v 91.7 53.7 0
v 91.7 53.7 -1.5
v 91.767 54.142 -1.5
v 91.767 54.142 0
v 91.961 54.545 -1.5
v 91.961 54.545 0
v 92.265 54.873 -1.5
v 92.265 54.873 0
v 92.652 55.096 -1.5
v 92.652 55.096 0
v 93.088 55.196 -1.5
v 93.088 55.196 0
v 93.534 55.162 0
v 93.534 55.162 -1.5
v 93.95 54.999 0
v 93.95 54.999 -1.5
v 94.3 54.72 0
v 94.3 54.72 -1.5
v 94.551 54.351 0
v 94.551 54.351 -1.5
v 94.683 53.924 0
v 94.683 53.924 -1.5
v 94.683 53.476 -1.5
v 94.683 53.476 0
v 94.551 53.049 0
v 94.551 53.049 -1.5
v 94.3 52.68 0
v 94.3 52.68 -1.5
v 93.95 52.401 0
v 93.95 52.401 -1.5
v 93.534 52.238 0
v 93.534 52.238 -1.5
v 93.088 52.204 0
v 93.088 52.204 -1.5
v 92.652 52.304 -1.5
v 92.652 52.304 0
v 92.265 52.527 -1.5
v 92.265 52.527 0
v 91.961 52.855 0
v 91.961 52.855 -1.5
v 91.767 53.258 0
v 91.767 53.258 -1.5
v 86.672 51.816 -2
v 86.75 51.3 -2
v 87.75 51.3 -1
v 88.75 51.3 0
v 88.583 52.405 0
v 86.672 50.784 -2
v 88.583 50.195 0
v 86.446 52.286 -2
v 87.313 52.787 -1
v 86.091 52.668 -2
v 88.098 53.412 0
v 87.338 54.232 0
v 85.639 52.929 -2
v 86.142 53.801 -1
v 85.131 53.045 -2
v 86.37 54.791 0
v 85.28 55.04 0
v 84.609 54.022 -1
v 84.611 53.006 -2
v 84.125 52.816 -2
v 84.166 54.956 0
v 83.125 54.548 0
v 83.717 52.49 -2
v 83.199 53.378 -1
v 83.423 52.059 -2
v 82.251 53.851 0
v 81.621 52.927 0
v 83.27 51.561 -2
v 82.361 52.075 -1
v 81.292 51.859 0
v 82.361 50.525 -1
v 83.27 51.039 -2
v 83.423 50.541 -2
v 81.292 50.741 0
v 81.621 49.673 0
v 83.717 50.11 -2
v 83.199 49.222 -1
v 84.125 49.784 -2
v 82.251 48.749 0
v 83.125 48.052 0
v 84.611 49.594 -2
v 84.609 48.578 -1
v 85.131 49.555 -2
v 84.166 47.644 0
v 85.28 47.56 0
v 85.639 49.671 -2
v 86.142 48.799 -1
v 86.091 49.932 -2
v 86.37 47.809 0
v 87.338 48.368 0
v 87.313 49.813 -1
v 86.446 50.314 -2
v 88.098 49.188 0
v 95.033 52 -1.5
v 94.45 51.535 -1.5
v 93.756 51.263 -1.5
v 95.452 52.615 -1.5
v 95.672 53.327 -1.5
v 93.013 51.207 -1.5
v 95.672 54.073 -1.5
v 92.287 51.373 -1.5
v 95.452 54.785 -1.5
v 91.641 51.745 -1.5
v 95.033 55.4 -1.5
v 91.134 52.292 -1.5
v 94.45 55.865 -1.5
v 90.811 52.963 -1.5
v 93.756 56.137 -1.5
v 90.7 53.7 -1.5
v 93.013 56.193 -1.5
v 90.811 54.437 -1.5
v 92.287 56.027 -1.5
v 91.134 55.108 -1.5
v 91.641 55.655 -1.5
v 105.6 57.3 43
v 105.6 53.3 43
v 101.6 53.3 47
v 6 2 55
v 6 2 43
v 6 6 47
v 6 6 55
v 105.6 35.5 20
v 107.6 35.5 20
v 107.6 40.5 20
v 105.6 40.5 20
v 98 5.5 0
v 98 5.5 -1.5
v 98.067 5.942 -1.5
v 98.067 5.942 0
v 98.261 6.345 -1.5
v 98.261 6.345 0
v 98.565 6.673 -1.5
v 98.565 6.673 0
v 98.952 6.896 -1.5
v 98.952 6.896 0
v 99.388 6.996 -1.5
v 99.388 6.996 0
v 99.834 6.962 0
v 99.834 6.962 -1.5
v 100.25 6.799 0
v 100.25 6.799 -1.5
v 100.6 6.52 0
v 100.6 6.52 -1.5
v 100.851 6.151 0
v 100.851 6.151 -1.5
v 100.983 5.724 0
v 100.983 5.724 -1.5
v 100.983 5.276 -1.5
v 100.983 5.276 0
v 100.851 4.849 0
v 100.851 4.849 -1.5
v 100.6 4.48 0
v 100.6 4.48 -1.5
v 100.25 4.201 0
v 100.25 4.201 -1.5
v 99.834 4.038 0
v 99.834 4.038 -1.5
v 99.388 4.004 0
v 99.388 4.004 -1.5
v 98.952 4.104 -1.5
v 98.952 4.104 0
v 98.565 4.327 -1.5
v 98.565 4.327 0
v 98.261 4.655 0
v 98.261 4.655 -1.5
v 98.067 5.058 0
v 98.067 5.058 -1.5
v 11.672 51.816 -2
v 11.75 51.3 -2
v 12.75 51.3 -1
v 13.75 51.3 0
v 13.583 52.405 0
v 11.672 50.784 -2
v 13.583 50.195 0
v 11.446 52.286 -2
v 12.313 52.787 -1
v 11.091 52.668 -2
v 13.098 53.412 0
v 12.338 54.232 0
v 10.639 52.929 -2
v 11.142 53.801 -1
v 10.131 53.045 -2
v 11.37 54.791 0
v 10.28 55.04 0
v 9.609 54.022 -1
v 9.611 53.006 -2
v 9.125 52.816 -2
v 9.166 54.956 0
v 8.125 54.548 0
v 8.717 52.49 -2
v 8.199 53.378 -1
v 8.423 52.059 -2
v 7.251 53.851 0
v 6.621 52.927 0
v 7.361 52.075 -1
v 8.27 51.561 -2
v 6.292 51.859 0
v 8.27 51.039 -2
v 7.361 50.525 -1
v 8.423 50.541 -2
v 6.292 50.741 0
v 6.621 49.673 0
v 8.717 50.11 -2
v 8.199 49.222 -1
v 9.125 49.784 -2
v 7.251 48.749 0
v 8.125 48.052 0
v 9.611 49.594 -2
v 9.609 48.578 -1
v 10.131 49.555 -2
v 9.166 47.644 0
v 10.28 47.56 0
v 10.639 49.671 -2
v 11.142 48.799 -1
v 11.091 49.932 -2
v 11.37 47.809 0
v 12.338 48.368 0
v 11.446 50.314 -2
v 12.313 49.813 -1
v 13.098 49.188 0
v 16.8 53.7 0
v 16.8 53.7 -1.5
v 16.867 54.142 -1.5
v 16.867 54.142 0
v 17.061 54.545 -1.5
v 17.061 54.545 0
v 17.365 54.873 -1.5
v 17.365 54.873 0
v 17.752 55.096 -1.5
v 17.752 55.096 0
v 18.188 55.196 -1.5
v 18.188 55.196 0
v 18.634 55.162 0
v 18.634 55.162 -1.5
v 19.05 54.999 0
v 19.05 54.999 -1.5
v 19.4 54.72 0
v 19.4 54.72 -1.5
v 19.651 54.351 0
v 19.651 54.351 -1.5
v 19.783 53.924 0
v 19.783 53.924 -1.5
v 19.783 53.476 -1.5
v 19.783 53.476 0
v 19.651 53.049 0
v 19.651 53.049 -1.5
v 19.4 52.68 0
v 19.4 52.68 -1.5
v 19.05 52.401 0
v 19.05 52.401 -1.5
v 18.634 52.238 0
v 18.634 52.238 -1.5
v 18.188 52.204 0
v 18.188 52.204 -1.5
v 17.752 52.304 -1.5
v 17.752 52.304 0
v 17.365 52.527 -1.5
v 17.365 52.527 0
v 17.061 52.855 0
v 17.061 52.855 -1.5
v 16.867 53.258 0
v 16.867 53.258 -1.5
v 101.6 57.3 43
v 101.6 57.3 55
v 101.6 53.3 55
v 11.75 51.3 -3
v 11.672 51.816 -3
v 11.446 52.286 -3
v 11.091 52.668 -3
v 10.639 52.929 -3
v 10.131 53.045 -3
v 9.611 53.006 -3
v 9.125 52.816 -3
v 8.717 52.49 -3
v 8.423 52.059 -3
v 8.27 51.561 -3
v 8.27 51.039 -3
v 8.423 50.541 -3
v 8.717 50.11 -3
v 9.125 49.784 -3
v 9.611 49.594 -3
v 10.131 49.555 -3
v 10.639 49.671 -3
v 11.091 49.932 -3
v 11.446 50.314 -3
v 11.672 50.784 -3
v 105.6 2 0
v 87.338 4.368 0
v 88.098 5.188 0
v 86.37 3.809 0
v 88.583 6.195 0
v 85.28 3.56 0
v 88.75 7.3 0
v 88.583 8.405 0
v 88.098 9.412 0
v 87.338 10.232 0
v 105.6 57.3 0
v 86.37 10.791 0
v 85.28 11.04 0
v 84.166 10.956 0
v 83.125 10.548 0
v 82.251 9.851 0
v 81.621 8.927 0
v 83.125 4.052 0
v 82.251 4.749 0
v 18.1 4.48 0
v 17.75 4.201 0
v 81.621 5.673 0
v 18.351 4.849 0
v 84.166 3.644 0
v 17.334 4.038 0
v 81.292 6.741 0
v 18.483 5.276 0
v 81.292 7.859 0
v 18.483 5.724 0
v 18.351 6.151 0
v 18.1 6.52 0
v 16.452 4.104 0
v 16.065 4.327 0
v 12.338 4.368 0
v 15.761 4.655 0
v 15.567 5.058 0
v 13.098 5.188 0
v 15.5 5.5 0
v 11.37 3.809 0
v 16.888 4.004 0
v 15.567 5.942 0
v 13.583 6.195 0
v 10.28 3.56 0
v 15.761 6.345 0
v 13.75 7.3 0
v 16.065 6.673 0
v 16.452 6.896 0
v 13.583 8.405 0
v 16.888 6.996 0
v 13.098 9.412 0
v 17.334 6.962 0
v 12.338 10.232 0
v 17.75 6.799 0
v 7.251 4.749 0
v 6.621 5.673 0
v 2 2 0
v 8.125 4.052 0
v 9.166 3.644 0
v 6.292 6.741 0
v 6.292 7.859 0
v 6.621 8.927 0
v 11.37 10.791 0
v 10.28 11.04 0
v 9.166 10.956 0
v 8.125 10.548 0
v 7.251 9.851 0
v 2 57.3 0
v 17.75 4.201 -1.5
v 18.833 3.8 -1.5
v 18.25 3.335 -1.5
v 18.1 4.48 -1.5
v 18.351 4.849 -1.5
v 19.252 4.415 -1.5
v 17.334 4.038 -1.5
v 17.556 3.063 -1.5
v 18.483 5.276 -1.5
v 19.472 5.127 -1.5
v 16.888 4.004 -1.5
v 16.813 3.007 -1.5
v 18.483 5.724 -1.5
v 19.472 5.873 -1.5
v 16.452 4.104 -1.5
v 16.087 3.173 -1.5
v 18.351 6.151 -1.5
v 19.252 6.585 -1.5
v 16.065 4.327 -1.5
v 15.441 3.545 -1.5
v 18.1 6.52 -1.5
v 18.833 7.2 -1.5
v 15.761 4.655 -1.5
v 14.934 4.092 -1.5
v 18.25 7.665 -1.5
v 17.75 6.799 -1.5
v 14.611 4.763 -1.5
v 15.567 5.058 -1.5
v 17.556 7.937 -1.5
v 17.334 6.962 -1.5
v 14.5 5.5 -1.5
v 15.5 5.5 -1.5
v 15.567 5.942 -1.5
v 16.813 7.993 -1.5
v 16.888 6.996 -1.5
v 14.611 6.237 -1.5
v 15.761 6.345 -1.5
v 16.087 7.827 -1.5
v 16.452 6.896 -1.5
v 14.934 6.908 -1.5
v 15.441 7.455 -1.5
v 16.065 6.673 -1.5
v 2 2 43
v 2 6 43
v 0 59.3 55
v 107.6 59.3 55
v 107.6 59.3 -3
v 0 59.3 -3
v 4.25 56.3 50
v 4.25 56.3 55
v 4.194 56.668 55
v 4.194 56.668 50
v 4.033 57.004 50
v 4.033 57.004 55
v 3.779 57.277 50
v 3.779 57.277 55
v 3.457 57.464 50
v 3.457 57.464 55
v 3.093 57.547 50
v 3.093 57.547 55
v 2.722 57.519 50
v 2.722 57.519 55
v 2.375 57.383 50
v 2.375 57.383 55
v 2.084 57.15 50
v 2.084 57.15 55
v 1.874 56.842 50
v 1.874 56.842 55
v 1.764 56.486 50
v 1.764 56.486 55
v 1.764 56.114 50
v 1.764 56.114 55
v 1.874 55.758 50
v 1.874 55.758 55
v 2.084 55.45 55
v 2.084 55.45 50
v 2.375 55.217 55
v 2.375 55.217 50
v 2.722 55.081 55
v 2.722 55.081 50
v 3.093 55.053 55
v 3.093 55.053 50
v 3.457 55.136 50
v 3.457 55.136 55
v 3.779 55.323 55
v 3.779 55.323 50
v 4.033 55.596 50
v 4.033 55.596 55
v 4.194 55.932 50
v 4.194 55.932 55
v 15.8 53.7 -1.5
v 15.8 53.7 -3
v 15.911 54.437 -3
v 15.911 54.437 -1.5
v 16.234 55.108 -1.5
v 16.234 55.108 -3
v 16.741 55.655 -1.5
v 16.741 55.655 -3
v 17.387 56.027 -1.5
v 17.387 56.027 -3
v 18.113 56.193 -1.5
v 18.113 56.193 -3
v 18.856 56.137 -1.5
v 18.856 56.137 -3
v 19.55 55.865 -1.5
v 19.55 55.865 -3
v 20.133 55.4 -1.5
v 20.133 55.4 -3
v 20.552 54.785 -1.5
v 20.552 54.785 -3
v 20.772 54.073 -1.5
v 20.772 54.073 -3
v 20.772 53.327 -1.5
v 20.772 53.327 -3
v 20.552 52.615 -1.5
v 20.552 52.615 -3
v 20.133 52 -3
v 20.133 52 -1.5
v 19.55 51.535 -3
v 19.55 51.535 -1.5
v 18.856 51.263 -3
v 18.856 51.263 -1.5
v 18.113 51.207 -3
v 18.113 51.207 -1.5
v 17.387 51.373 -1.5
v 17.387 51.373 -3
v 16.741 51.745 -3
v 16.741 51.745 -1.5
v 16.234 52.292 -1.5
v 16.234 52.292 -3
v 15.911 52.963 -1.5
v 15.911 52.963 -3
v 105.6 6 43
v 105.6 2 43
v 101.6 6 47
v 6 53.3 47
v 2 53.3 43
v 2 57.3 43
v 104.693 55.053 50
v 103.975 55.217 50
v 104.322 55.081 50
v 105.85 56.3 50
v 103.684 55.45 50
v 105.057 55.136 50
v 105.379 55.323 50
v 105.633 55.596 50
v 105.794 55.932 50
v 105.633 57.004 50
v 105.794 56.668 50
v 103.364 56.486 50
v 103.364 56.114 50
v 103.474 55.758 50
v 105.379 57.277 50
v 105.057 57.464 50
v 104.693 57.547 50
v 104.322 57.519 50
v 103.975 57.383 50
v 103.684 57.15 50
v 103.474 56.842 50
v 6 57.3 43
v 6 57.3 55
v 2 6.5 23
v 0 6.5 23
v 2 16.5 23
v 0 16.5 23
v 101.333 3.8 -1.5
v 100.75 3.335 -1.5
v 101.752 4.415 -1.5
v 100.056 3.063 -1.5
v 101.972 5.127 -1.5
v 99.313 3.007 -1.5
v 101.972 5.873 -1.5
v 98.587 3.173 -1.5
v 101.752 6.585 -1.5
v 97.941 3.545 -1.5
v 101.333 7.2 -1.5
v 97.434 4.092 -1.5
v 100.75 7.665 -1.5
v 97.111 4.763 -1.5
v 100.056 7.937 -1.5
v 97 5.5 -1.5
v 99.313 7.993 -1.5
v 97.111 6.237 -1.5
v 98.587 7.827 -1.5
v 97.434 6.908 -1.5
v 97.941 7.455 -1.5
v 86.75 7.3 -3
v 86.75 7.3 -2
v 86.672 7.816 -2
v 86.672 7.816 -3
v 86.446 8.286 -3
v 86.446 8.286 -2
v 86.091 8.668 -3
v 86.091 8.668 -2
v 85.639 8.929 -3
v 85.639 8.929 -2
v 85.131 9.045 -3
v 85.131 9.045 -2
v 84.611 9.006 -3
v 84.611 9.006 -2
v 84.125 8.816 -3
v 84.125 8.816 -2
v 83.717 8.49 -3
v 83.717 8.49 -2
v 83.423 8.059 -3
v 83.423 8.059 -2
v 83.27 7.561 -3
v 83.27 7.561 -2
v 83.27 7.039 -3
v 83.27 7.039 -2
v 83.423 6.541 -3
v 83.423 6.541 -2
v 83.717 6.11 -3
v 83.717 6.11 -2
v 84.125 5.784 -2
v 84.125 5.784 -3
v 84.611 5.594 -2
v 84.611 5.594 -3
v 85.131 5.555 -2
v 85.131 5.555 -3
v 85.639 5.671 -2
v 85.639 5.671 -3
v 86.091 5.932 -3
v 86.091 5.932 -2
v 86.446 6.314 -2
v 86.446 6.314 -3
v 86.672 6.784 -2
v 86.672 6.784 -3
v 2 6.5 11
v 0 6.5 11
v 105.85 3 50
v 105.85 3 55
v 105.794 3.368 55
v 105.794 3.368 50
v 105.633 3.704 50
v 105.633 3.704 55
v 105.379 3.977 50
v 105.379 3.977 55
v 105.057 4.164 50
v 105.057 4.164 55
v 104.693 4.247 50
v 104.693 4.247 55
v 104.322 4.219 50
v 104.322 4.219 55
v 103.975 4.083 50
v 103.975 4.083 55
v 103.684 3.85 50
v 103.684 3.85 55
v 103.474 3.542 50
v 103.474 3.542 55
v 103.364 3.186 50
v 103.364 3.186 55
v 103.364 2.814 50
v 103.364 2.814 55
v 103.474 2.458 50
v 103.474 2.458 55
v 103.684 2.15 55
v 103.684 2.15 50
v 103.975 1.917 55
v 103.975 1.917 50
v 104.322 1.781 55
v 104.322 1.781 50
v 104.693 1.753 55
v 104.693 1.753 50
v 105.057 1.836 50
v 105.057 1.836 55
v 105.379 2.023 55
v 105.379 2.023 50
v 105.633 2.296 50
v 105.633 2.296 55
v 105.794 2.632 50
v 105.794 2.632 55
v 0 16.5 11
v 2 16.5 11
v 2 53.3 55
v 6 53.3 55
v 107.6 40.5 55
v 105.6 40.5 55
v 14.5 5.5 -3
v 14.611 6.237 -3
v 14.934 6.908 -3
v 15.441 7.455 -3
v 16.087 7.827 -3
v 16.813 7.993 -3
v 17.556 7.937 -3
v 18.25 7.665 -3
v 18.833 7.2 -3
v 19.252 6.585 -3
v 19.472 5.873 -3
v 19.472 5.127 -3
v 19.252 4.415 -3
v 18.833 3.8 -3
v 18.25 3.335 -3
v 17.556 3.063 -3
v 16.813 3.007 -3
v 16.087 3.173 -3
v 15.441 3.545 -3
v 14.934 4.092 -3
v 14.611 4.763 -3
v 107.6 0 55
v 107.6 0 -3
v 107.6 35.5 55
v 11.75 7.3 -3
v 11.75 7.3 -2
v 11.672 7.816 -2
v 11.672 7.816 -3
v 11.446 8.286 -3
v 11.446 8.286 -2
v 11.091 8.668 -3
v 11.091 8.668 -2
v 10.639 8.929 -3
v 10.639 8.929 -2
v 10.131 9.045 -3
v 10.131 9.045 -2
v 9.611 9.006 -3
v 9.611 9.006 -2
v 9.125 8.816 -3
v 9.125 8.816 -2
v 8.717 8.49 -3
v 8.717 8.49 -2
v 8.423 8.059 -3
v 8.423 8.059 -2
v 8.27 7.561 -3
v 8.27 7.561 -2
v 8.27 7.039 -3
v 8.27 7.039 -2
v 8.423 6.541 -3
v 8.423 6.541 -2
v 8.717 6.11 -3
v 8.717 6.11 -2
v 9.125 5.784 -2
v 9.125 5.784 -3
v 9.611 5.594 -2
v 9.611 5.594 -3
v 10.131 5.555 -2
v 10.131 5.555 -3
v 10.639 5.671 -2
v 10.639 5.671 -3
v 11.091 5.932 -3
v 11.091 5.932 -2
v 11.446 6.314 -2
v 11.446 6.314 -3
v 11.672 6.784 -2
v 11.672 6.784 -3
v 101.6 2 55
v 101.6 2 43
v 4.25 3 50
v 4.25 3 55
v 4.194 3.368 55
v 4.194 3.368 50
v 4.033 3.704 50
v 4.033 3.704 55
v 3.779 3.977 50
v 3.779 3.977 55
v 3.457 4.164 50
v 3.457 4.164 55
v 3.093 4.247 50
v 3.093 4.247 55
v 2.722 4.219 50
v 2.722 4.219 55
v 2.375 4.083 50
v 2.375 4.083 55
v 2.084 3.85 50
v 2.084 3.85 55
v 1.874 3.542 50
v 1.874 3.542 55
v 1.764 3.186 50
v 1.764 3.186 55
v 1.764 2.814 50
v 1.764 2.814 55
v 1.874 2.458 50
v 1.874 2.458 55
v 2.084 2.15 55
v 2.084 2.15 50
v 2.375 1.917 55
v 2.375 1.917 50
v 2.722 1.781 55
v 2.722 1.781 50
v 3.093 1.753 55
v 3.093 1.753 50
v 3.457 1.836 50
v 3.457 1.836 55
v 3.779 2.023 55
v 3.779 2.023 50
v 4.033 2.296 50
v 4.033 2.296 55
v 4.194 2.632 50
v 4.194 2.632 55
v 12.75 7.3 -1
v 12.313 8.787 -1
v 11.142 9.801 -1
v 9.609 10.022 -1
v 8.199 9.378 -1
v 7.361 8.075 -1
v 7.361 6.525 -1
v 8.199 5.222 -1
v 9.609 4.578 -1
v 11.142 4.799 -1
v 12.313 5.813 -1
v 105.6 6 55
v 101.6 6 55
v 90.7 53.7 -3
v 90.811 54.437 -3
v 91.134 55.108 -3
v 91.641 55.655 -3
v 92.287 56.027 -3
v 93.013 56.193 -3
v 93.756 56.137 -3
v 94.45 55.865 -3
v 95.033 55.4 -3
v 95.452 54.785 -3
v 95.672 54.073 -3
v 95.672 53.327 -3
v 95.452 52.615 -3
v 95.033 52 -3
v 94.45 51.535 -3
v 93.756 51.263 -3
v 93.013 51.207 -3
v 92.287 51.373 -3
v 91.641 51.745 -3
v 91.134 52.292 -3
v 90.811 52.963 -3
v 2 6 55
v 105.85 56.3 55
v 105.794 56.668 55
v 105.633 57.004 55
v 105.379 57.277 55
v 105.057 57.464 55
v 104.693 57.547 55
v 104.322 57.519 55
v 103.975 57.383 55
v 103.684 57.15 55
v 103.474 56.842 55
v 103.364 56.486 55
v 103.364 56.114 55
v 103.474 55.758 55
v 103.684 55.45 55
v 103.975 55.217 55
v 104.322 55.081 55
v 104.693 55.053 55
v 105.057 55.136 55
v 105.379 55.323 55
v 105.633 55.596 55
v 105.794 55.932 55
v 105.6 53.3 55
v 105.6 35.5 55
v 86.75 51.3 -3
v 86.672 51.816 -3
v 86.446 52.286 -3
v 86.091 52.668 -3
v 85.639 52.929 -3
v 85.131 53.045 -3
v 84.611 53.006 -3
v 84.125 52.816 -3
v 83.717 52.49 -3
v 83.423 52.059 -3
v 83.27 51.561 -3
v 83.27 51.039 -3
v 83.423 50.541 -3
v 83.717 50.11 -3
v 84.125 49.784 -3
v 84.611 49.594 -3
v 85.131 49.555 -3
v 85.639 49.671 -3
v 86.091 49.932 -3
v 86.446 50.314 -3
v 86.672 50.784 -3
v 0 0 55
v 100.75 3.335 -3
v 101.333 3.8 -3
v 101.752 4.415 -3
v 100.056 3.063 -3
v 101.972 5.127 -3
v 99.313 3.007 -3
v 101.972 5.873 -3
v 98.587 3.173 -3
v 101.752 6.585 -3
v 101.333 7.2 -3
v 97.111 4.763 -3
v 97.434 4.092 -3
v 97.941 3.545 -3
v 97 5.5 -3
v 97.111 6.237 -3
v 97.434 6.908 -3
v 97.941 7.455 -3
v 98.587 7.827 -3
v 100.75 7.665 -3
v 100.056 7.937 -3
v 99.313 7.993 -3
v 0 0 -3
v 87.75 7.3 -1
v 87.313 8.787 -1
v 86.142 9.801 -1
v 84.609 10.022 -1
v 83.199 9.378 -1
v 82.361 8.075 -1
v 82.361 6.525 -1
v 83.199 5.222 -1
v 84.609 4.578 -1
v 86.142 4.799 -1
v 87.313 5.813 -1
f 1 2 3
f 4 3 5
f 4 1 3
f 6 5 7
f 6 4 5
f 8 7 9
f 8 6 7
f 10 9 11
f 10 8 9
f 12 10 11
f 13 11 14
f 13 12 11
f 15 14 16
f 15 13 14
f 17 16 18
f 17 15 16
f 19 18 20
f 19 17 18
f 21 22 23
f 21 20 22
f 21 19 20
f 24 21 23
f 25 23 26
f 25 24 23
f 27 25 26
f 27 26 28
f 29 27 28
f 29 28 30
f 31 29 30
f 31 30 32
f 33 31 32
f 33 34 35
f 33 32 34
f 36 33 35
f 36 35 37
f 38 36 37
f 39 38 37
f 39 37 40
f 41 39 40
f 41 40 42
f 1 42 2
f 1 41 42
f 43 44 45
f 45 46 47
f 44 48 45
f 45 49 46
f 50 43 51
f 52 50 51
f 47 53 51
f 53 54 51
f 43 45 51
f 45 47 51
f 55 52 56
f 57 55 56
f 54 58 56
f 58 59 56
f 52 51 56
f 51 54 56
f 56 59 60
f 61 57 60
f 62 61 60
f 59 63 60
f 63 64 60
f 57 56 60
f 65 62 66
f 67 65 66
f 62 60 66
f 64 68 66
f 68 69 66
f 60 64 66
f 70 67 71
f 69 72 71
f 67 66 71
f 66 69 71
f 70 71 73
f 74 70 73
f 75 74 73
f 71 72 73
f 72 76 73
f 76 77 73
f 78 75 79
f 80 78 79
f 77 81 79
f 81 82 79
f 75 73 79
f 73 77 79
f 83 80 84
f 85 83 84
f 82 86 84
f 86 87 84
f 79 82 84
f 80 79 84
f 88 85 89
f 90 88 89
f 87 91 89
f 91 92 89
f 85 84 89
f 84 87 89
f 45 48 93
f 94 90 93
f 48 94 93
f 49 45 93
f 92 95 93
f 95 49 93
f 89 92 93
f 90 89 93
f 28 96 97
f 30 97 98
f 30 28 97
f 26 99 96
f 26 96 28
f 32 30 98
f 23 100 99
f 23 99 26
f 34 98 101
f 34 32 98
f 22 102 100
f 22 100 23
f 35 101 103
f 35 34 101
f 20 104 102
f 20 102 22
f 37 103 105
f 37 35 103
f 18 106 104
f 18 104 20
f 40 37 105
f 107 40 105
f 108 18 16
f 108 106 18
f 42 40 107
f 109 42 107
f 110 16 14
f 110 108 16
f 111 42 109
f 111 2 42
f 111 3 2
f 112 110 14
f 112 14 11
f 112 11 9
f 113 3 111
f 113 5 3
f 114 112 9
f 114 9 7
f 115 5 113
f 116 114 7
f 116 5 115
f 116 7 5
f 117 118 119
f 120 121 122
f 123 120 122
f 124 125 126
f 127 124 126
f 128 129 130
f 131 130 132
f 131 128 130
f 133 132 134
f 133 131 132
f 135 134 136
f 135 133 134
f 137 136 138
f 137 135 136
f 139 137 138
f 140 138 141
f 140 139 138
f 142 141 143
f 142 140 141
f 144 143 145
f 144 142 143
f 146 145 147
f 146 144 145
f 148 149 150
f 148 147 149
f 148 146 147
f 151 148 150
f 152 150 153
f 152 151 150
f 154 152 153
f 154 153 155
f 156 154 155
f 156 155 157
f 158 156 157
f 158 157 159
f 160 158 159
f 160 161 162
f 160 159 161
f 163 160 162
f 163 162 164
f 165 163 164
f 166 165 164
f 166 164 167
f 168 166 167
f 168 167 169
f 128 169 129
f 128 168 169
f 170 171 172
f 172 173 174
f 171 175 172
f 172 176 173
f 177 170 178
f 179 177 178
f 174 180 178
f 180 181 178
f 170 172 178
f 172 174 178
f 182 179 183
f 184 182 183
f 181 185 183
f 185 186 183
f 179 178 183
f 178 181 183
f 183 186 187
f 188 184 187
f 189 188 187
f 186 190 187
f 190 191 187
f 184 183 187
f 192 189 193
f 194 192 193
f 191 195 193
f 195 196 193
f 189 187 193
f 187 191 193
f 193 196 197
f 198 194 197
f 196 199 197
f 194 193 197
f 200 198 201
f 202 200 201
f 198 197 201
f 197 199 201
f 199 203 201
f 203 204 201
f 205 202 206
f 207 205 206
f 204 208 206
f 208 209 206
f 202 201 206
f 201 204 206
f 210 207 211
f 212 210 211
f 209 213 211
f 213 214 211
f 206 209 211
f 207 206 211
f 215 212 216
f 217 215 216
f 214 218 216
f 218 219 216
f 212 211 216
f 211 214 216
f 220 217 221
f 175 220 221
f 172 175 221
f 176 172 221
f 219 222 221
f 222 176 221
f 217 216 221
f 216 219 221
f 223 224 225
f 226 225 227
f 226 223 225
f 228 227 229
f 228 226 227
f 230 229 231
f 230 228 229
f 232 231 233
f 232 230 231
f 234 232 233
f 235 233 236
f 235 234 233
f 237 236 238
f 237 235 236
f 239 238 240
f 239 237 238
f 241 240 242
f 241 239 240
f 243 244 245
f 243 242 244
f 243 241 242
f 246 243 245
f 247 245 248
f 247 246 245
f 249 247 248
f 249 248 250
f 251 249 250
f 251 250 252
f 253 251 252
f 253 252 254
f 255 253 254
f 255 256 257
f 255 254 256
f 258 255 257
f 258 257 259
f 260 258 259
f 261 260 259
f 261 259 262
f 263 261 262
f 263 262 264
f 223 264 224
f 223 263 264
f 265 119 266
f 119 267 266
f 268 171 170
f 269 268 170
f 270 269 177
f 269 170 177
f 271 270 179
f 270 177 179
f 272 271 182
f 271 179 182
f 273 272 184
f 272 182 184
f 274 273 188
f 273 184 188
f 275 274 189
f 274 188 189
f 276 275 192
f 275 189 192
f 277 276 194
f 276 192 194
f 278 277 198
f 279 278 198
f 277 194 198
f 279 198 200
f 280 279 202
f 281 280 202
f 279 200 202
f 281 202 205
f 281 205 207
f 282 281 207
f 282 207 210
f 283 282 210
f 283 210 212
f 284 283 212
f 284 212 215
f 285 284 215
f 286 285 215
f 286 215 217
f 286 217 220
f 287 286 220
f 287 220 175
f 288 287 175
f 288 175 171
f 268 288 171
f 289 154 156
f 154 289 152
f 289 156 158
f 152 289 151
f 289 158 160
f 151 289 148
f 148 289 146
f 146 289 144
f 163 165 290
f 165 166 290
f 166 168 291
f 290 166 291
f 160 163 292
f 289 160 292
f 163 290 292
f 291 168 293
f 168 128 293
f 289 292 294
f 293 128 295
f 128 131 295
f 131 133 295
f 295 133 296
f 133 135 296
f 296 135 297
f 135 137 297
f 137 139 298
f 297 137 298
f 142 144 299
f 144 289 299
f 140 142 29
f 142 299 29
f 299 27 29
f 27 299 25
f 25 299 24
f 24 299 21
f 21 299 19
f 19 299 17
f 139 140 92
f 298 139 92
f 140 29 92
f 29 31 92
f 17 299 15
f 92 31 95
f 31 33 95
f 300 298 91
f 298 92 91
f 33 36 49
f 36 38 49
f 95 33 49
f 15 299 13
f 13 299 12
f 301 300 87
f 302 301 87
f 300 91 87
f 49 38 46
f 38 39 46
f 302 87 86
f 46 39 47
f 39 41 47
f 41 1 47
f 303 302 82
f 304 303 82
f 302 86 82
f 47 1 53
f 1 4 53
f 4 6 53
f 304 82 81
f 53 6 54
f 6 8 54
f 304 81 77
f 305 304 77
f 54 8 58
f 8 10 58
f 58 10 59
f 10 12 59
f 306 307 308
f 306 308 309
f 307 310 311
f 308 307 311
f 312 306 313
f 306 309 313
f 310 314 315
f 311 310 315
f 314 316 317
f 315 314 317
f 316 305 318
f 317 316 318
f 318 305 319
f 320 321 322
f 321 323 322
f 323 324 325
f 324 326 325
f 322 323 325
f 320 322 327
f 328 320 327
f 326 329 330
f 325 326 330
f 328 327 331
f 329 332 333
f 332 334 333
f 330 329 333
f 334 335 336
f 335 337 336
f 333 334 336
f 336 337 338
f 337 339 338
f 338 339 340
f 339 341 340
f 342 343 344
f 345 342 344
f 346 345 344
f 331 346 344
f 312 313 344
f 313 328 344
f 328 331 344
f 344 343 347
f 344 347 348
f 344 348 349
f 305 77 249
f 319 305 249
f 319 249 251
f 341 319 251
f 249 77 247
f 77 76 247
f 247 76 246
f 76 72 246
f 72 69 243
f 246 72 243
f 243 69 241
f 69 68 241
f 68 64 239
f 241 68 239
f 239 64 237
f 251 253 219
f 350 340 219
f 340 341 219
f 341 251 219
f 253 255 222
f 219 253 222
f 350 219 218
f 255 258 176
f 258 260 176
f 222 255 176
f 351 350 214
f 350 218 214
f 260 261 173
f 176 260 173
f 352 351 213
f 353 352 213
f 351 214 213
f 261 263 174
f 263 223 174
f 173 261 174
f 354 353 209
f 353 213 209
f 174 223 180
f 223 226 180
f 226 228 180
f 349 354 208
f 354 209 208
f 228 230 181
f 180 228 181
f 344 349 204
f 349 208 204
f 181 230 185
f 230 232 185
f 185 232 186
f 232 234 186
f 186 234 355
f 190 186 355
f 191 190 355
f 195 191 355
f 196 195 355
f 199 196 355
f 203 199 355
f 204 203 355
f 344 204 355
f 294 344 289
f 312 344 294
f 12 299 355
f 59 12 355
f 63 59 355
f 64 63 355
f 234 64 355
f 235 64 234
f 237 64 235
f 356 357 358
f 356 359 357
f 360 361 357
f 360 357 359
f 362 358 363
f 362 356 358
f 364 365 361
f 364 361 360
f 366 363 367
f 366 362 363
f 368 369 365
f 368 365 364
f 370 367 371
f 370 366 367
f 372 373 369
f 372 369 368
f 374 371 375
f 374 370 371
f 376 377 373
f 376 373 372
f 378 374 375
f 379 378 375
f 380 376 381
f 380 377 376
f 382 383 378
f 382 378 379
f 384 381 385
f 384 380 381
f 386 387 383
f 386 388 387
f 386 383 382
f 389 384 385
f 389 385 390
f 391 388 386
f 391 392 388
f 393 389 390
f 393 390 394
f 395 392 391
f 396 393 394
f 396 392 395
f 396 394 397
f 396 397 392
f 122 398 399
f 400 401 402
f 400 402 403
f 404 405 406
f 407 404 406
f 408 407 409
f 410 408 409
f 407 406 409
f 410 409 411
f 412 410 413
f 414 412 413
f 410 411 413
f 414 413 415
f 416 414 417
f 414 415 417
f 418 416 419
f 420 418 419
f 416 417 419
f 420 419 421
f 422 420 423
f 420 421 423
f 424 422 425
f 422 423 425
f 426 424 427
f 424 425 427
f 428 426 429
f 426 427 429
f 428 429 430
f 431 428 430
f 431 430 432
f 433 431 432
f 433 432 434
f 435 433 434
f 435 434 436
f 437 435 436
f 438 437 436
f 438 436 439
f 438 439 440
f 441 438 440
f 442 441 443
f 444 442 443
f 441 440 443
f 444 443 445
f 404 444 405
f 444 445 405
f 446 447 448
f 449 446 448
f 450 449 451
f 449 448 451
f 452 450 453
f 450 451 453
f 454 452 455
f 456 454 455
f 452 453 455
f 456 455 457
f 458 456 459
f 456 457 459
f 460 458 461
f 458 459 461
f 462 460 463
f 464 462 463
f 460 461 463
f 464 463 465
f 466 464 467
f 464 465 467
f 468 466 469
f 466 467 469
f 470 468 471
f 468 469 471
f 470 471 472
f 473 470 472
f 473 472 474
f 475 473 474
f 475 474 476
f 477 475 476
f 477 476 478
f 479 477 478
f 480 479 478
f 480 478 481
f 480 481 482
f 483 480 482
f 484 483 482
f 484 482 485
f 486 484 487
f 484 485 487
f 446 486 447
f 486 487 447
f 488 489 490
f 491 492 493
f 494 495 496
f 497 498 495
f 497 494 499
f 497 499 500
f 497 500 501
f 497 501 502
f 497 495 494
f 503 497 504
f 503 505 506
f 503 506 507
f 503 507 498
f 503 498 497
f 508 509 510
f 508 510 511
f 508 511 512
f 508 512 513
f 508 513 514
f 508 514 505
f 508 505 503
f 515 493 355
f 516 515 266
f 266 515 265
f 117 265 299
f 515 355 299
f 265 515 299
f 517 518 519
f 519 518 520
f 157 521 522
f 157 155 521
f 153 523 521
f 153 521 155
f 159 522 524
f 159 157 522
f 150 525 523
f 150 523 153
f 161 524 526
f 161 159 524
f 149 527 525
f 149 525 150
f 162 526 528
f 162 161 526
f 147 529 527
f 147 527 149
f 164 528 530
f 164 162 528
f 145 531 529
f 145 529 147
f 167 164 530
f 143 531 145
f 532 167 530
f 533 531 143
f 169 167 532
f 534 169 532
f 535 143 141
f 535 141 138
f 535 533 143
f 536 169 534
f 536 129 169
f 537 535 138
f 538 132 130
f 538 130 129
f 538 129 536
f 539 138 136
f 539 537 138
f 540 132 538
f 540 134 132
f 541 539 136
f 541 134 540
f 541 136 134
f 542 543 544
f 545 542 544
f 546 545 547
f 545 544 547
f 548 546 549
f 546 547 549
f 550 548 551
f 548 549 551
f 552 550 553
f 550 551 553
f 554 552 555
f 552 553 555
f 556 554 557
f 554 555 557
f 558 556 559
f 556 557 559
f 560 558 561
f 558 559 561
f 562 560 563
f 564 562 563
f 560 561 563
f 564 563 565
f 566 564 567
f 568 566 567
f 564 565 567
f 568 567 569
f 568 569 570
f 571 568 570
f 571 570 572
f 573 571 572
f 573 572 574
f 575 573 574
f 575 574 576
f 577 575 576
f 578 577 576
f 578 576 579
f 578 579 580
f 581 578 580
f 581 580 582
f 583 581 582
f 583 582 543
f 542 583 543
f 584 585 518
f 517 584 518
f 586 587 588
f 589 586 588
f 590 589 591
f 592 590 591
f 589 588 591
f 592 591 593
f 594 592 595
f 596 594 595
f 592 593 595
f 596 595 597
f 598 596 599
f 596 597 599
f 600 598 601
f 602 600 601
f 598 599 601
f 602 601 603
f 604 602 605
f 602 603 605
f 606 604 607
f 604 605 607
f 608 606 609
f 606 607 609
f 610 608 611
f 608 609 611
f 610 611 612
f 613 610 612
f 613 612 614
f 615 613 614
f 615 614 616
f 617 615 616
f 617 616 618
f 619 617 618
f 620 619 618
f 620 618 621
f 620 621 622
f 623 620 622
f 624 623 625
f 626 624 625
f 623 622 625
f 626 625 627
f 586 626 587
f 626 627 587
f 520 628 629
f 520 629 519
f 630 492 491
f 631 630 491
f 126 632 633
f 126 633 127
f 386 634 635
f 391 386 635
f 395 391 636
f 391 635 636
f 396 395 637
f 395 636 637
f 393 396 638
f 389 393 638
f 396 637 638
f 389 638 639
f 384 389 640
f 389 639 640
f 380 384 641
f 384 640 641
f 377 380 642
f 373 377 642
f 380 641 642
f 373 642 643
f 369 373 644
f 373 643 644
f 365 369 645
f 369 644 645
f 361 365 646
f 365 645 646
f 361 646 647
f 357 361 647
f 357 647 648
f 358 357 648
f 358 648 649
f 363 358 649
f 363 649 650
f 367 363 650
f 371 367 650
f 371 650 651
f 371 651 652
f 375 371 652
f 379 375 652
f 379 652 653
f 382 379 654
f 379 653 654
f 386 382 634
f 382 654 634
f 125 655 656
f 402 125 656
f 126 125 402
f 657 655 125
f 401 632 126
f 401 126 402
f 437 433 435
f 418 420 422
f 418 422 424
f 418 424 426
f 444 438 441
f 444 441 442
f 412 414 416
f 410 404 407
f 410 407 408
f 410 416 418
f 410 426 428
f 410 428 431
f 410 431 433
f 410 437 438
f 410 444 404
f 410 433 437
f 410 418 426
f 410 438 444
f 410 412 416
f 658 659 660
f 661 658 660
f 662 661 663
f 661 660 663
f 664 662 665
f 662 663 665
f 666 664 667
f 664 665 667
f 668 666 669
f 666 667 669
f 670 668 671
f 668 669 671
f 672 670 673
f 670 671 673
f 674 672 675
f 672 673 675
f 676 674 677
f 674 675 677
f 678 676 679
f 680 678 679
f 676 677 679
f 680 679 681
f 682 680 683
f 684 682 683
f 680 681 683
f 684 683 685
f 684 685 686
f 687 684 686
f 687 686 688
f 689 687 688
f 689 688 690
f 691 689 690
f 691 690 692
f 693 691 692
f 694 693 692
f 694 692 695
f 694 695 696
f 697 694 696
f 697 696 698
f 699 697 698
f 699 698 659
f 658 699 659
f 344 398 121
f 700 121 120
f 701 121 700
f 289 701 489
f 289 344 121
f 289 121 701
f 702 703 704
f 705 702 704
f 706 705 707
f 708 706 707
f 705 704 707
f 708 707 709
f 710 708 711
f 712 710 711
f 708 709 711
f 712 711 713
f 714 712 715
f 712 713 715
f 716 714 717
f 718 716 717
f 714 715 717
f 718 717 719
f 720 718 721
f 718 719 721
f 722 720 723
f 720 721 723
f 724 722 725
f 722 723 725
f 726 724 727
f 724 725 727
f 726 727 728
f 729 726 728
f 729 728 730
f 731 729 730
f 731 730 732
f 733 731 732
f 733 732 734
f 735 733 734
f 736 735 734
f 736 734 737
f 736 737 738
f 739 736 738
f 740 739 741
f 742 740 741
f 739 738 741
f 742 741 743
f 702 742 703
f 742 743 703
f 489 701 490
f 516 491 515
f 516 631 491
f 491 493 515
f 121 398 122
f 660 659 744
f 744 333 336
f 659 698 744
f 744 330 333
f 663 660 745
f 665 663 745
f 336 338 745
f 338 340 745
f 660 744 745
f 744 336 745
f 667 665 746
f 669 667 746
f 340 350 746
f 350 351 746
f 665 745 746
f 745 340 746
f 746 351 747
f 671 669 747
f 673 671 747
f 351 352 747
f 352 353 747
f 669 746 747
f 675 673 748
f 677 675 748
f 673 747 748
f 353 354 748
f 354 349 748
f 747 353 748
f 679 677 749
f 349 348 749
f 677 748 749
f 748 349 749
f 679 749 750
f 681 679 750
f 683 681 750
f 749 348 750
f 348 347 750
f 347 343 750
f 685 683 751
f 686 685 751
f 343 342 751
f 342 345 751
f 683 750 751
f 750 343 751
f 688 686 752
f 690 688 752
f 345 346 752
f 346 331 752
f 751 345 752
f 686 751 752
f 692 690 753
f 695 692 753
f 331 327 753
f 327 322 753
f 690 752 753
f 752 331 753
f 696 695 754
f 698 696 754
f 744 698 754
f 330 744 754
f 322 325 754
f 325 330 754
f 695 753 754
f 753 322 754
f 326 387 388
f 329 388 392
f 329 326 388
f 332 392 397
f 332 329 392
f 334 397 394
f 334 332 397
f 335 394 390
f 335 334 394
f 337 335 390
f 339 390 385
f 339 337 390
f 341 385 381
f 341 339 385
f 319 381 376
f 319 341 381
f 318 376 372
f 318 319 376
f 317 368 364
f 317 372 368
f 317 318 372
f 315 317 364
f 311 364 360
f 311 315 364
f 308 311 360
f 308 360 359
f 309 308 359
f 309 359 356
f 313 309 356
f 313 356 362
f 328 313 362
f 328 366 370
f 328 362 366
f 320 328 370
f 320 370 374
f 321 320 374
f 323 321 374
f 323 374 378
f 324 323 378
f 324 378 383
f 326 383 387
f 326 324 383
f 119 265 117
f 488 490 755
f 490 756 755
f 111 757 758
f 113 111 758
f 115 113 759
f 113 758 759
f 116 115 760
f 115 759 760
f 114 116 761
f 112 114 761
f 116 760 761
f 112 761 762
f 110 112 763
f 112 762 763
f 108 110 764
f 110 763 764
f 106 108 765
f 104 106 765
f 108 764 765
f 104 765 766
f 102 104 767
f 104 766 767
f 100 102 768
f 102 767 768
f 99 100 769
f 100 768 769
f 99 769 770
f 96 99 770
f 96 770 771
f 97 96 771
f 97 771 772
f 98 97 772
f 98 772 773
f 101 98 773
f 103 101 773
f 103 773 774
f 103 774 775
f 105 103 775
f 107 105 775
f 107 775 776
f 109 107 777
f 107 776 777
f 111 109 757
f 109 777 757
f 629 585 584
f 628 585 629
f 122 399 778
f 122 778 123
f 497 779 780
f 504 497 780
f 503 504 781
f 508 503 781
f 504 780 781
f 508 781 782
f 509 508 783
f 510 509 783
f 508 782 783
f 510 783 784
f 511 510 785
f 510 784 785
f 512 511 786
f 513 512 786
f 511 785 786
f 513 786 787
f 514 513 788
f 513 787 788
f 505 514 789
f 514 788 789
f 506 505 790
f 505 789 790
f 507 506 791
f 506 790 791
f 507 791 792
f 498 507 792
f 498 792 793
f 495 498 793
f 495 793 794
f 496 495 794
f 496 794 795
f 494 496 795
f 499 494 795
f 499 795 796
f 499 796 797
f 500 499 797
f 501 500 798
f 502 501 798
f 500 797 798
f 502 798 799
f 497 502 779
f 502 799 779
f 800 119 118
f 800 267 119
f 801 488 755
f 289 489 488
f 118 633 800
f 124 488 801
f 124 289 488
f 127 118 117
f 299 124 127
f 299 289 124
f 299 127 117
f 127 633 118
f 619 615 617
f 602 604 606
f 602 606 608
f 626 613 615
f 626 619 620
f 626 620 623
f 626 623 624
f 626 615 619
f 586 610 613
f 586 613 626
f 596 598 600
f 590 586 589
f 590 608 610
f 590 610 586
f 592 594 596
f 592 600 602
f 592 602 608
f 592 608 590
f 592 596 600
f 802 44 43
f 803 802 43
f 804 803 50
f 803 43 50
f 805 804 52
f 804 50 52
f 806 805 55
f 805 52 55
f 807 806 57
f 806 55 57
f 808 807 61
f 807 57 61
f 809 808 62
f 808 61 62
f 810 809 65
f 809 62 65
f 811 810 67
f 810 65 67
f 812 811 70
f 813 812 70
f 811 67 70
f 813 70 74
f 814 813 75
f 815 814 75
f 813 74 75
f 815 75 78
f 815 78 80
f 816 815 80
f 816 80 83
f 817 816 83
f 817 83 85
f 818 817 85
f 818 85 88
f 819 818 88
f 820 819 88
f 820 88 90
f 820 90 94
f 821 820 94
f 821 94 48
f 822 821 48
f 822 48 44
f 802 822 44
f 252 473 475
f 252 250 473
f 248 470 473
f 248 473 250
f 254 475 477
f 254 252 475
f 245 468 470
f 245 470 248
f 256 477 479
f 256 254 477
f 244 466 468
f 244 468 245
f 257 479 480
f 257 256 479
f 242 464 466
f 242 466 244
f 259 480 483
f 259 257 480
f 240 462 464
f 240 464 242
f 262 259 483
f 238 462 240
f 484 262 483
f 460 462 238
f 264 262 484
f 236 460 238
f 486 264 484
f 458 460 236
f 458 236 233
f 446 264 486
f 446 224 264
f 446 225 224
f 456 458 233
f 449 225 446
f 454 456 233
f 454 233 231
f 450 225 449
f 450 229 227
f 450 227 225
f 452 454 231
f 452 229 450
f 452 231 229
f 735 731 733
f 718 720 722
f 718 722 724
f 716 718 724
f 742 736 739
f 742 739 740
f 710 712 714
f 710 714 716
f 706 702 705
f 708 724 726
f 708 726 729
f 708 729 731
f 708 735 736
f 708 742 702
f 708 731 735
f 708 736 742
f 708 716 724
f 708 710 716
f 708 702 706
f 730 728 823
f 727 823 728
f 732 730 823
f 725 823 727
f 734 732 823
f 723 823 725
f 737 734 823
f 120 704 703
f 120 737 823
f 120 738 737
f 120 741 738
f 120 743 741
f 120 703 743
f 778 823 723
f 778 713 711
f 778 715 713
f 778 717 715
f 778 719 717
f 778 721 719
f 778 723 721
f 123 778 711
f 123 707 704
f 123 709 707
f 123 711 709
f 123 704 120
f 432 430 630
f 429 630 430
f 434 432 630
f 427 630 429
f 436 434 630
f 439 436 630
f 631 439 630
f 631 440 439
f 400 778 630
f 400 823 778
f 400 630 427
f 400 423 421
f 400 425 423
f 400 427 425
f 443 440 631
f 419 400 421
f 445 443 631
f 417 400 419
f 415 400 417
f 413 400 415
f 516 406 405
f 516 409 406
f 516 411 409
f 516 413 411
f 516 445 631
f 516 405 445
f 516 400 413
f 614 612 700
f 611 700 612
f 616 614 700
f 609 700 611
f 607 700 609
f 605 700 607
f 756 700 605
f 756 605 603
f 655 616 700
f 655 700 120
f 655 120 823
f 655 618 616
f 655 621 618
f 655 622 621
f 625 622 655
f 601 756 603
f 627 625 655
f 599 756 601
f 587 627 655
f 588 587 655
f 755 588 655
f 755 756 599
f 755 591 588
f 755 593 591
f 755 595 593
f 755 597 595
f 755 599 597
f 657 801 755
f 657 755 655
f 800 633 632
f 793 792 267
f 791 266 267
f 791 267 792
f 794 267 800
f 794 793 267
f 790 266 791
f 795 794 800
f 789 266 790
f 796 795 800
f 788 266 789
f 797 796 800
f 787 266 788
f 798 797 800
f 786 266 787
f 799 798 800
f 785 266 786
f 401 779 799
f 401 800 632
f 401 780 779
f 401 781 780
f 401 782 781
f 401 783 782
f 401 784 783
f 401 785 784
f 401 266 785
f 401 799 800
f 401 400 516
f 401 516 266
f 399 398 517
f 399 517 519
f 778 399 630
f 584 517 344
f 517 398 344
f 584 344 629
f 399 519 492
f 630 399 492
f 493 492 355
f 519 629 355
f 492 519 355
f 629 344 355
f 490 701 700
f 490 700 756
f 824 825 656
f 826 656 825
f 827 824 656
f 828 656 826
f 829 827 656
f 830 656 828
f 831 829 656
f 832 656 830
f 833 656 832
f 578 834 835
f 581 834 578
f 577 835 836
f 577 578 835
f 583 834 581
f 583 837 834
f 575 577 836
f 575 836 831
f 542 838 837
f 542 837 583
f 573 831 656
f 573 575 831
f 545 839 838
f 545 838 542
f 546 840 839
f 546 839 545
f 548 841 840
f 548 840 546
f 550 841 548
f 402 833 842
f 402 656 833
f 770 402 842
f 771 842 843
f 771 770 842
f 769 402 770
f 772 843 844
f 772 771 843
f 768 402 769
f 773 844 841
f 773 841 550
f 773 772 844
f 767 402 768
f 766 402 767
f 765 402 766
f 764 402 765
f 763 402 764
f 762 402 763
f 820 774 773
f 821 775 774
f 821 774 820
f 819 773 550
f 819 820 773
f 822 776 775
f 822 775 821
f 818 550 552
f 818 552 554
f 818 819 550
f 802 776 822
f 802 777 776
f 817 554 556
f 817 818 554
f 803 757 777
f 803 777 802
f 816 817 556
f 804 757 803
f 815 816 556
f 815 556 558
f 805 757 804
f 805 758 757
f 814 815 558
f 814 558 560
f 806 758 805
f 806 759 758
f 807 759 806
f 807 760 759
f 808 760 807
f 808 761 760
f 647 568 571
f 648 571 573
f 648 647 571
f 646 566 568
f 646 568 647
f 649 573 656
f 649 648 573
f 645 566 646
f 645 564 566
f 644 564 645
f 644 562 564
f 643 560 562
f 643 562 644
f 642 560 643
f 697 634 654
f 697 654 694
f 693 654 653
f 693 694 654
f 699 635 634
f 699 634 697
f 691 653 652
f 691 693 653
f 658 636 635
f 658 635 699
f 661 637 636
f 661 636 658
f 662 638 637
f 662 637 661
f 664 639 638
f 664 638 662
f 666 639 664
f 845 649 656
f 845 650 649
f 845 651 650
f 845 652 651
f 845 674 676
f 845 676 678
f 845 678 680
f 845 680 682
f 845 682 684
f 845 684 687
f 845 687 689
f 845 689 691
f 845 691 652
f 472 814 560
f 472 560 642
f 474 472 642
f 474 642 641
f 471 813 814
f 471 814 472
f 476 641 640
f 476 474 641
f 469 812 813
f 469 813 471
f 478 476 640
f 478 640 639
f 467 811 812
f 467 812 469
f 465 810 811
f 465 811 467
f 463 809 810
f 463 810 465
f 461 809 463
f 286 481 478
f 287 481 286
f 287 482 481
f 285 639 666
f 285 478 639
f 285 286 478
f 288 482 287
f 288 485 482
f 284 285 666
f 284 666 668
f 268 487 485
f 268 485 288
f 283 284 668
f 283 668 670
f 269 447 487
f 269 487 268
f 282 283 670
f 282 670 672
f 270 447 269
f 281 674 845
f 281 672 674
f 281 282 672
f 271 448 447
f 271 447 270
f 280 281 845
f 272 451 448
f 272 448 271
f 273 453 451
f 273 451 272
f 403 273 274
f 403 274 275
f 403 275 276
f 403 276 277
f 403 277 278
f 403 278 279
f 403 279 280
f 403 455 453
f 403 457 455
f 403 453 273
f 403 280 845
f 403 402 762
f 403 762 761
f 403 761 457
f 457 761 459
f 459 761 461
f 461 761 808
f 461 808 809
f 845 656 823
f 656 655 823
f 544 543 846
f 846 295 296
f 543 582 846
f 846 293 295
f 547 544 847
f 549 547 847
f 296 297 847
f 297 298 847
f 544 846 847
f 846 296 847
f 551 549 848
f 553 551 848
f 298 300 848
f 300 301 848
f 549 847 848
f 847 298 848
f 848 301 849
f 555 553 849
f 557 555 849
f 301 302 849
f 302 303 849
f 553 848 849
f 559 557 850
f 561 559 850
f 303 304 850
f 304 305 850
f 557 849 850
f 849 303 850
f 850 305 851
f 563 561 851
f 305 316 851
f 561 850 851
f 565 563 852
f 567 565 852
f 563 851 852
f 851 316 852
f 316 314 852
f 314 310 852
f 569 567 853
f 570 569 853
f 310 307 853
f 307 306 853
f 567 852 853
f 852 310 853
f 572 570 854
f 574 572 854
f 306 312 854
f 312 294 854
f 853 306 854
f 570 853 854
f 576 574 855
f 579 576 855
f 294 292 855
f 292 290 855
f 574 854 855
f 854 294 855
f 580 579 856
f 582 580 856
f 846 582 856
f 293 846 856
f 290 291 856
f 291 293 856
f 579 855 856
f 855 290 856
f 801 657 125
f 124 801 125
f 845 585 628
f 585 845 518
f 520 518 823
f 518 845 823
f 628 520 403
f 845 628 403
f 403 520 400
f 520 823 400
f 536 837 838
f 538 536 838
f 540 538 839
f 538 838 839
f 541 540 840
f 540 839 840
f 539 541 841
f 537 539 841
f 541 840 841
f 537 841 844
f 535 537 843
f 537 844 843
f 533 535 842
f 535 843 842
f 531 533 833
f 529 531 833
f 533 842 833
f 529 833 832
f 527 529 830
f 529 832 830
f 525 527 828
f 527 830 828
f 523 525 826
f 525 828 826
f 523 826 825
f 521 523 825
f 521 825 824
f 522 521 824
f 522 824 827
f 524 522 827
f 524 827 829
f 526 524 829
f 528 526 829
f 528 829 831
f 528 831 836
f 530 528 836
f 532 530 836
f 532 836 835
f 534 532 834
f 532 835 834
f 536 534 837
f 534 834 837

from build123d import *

# Parameters (mm, degrees)
SKETCH1_W           = 107.6
SKETCH1_H           = 59.3
SKETCH1_W_2         = 103.6
SKETCH1_H_2         = 55.3
BOSS_EXTRUDE1_DEPTH = 55
SKETCH2_W           = 107.6
SKETCH2_H           = 59.3
SKETCH2_R           = 1.5
BOSS_EXTRUDE2_DEPTH = 3
SKETCH3_R           = 2.5
CUT_EXTRUDE1_DEPTH  = 1.5
SKETCH4_W           = 12
SKETCH4_H           = 10
CUT_EXTRUDE2_DEPTH  = 5
SKETCH5_W           = 35
SKETCH5_H           = 5
CUT_EXTRUDE3_DEPTH  = 5
SKETCH8_R           = 1.75
CUT_EXTRUDE4_DEPTH  = 10
CHAMFER1_SIZE       = 2
SKETCH9_W           = 4
SKETCH9_H           = 4
BOSS_EXTRUDE4_DEPTH = 8
CHAMFER2_SIZE       = 4
SKETCH10_R          = 1.25
CUT_EXTRUDE5_DEPTH  = 5


with BuildPart() as part:
    # Sketch1 → Boss-Extrude1 (new body)
    with BuildSketch(Plane.XY):
        with Locations((53.8, 29.65)):
            Rectangle(SKETCH1_W, SKETCH1_H)
        with Locations((53.8, 29.65)):
            Rectangle(SKETCH1_W_2, SKETCH1_H_2, mode=Mode.SUBTRACT)
    extrude(amount=BOSS_EXTRUDE1_DEPTH)

    # Sketch2 → Boss-Extrude2 (add)
    with BuildSketch(Plane(origin=(0, 0, 0), x_dir=(-1, 0, 0), z_dir=(0, 0, -1))):
        with Locations((-53.8, 29.65)):
            Rectangle(SKETCH2_W, SKETCH2_H)
        with Locations((-18.3, 53.7)):
            Circle(SKETCH2_R, mode=Mode.SUBTRACT)
        with Locations((-17, 5.5)):
            Circle(SKETCH2_R, mode=Mode.SUBTRACT)
        with Locations((-93.2, 53.7)):
            Circle(SKETCH2_R, mode=Mode.SUBTRACT)
        with Locations((-99.5, 5.5)):
            Circle(SKETCH2_R, mode=Mode.SUBTRACT)
    extrude(amount=BOSS_EXTRUDE2_DEPTH)

    # Sketch3 → Cut-Extrude1 (cut)
    with BuildSketch(Plane(origin=(0, 0, -3), x_dir=(-1, 0, 0), z_dir=(0, 0, -1))):
        with Locations((-93.2, 53.7)):
            Circle(SKETCH3_R)
        with Locations((-18.3, 53.7)):
            Circle(SKETCH3_R)
        with Locations((-17, 5.5)):
            Circle(SKETCH3_R)
        with Locations((-99.5, 5.5)):
            Circle(SKETCH3_R)
    extrude(amount=-CUT_EXTRUDE1_DEPTH, mode=Mode.SUBTRACT)

    # Sketch4 → Cut-Extrude2 (cut)
    with BuildSketch(Plane.ZY):
        with Locations((17, 11.5)):
            Rectangle(SKETCH4_W, SKETCH4_H)
    extrude(amount=-CUT_EXTRUDE2_DEPTH, mode=Mode.SUBTRACT)

    # Sketch5 → Cut-Extrude3 (cut)
    with BuildSketch(Plane(origin=(107.6, 0, 0), x_dir=(0, 0, -1), z_dir=(1, 0, 0))):
        with Locations((-37.5, 38)):
            Rectangle(SKETCH5_W, SKETCH5_H)
    extrude(amount=-CUT_EXTRUDE3_DEPTH, mode=Mode.SUBTRACT)

    # Sketch8 → Cut-Extrude4 (cut)
    with BuildSketch(Plane.XY):
        with Locations((10, 51.3)):
            Circle(SKETCH8_R)
        with Locations((85, 51.3)):
            Circle(SKETCH8_R)
        with Locations((85, 7.3)):
            Circle(SKETCH8_R)
        with Locations((10, 7.3)):
            Circle(SKETCH8_R)
    extrude(amount=-CUT_EXTRUDE4_DEPTH, mode=Mode.SUBTRACT)

    # Chamfer1
    chamfer1_edges = [part.edges().sort_by_distance(p)[0] for p in [
        (8.25, 7.3, 0),
        (83.25, 7.3, 0),
        (83.25, 51.3, 0),
        (8.25, 51.3, 0),
    ]]
    chamfer(chamfer1_edges, length=CHAMFER1_SIZE)

    # Sketch9 → Boss-Extrude4 (add)
    with BuildSketch(Plane.XY.offset(55)):
        with Locations((4, 4)):
            Rectangle(SKETCH9_W, SKETCH9_H)
        with Locations((103.6, 55.3)):
            Rectangle(SKETCH9_W, SKETCH9_H)
        with Locations((103.6, 4)):
            Rectangle(SKETCH9_W, SKETCH9_H)
        with Locations((4, 55.3)):
            Rectangle(SKETCH9_W, SKETCH9_H)
    extrude(amount=-BOSS_EXTRUDE4_DEPTH)

    # Chamfer2
    chamfer2_edges = [part.edges().sort_by_distance(p)[0] for p in [
        (4, 57.3, 47),
        (2, 55.3, 47),
        (4, 2, 47),
        (2, 4, 47),
        (105.6, 4, 47),
        (103.6, 2, 47),
        (103.6, 57.3, 47),
        (105.6, 55.3, 47),
    ]]
    chamfer(chamfer2_edges, length=CHAMFER2_SIZE - 0.0001)  # a hair under: the kernel refuses the full size

    # Sketch10 → Cut-Extrude5 (cut)
    with BuildSketch(Plane.XY.offset(55)):
        with Locations((3, 56.3)):
            Circle(SKETCH10_R)
        with Locations((104.6, 56.3)):
            Circle(SKETCH10_R)
        with Locations((104.6, 3)):
            Circle(SKETCH10_R)
        with Locations((3, 3)):
            Circle(SKETCH10_R)
    extrude(amount=-CUT_EXTRUDE5_DEPTH, mode=Mode.SUBTRACT)


solid = part.part
